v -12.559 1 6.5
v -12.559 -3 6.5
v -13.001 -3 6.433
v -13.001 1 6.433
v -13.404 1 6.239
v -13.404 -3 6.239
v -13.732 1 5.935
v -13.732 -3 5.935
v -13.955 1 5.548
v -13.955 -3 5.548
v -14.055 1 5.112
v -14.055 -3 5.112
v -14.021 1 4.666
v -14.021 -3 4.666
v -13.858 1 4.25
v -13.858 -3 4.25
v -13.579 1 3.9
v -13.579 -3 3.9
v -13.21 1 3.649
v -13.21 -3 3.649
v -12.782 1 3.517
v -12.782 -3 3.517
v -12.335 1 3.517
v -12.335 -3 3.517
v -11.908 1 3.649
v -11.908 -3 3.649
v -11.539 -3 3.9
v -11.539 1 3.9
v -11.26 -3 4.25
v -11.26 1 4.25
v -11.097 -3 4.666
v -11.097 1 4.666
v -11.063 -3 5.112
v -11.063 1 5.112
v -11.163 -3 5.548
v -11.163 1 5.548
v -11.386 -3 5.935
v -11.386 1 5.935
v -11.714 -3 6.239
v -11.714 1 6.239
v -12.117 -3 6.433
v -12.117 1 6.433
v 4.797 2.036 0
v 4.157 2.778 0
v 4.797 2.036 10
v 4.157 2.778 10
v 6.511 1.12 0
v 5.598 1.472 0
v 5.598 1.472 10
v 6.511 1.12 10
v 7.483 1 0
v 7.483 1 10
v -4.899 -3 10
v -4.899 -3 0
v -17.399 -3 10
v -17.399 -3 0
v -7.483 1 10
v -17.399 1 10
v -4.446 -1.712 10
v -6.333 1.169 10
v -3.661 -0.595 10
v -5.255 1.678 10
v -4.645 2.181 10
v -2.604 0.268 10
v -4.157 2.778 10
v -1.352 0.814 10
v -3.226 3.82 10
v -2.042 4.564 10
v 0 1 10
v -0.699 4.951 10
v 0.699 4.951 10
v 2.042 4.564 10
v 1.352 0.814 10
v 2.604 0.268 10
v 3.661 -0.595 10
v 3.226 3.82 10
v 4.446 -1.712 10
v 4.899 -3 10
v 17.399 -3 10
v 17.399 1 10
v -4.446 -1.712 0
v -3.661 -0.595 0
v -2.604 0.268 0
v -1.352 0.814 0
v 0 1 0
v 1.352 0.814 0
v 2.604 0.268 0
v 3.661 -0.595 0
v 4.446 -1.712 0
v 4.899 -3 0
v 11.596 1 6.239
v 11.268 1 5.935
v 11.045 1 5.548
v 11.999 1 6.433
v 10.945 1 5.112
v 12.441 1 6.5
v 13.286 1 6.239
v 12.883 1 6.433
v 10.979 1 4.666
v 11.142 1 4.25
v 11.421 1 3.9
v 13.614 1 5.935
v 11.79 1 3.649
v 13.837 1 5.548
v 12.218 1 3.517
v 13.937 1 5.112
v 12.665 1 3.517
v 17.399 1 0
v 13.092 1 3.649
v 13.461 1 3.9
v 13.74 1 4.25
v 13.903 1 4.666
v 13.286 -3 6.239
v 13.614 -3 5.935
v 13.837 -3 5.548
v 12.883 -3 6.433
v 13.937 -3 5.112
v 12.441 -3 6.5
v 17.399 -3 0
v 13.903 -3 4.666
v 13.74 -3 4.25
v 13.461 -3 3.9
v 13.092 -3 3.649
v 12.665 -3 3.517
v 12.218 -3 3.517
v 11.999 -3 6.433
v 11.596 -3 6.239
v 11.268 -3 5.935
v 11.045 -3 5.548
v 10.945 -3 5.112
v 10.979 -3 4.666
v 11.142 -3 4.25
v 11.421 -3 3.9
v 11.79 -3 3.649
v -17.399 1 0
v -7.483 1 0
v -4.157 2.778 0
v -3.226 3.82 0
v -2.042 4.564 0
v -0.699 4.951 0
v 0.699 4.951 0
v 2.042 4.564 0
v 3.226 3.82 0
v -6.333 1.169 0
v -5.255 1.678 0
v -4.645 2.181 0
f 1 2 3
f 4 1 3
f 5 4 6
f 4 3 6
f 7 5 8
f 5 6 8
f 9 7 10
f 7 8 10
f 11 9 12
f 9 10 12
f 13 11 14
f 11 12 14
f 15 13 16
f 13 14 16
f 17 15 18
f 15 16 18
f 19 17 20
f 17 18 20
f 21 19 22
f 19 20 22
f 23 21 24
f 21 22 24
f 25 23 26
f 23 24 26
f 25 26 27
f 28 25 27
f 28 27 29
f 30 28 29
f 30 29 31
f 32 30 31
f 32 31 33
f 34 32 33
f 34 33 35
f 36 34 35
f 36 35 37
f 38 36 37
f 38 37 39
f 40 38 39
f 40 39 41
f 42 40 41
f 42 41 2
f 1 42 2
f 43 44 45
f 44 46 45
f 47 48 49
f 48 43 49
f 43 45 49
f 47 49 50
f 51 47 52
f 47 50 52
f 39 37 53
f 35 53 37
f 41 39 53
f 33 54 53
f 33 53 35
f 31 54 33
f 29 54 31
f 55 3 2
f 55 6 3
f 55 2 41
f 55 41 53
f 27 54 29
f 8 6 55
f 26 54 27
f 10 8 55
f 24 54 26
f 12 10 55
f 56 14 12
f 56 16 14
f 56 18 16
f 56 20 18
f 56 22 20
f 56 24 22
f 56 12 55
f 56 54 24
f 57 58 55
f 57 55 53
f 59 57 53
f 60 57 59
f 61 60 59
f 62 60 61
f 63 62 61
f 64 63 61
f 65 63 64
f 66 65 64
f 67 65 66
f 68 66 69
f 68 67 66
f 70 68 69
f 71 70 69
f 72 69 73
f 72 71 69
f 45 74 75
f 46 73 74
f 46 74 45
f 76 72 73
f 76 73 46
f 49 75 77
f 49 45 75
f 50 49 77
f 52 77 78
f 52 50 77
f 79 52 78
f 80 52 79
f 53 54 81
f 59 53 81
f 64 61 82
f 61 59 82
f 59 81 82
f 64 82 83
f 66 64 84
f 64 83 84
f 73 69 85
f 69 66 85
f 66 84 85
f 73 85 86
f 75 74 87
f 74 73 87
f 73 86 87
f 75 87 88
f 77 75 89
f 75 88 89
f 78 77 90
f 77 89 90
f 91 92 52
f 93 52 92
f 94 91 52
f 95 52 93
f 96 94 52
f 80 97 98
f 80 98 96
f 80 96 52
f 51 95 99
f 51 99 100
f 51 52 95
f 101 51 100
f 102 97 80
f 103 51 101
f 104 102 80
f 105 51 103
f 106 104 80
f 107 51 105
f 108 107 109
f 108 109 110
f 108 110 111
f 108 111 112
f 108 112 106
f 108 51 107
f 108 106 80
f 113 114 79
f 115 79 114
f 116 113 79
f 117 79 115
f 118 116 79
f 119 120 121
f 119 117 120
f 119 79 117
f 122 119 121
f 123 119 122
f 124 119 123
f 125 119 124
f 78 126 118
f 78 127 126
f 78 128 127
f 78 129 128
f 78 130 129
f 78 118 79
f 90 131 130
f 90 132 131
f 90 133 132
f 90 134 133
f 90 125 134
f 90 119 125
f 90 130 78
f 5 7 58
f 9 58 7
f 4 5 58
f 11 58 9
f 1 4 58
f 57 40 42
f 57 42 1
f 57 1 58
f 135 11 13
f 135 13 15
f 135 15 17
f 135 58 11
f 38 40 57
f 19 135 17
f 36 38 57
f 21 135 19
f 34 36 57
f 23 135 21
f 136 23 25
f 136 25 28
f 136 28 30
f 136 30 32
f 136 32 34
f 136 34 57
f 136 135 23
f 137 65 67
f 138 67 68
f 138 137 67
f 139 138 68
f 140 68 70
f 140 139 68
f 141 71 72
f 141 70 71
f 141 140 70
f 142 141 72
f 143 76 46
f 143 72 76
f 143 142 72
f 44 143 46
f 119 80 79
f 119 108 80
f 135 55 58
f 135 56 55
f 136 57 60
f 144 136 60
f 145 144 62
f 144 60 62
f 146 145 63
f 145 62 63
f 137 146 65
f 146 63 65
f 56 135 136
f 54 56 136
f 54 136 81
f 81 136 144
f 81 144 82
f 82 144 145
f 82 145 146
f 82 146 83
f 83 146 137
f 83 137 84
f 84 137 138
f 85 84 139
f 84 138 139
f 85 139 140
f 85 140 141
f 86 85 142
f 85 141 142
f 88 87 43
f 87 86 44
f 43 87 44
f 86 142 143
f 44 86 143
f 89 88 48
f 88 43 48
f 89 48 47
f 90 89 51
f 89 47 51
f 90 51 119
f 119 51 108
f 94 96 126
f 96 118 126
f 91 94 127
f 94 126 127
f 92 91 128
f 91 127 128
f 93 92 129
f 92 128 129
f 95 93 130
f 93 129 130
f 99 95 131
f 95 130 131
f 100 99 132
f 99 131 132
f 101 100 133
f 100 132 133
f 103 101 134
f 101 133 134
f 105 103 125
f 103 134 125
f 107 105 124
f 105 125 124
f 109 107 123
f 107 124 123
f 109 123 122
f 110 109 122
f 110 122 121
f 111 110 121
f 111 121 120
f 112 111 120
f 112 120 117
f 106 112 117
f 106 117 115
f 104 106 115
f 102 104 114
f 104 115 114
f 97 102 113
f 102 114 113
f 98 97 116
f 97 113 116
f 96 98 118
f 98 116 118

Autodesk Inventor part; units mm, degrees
ref_plane "YZ Plane" through (0, 0, 0) normal (1, 0, 0) x (0, 1, 0)
ref_plane "XZ Plane" through (0, 0, 0) normal (0, 1, 0) x (-1, 0, 0)
ref_plane "XY Plane" through (0, 0, 0) normal (0, 0, 1) x (1, 0, 0)
sketch "Skizze1" plane through (0, 0, 0) normal (0, 0, 1) x (1, 0, 0)
  arc A0 (4.899, 1) -> (-4.899, 1) centre (0, 0) ccw
  line L0 (-17.399, 1) -> (-7.218, 1)
  line L1 (-7.218, 1) -> (-4.899, 1)
  line L2 (4.899, 1) -> (17.399, 1)
  line L3 (17.399, 1) -> (17.399, -3)
  line L4 (-17.399, -3) -> (-17.399, 1)
  arc A1 (4.899, -3) -> (-4.899, -3) centre (0, -4) ccw
  line L5 (17.399, -3) -> (4.899, -3)
  line L6 (-4.899, -3) -> (-17.399, -3)
  dimension "d0" = 10
  dimension "d1" = 1
  dimension "d3" = 10
  dimension "d16" = 4
  dimension "d17" = 12.5
  dimension "d18" = 12.5
extrude "Extrusion1" add sketch "Skizze1" along normal blind 10
fillet "Rundung1" radius 4 2 edges at (-4.899, 1, 5) (4.899, 1, 5)
sketch "Skizze4" plane through (-17.399, 1, 10) normal (0, 1, 0) x (1, 0, 0)
  line L0 (0, 10) -> (9.9157, 10) projected
  line L1 (0, 10) -> (0, 0) projected
  line L2 (9.9157, 0) -> (0, 0) projected
  line L3 (9.9157, 10) -> (9.9157, 0) projected
  line L4 (34.798, 10) -> (34.798, 0) projected
  line L5 (24.8823, 10) -> (34.798, 10) projected
  line L6 (24.8823, 0) -> (24.8823, 10) projected
  line L7 (34.798, 0) -> (24.8823, 0) projected
  point P0 (17.399, 10)
  point P1 (4.8401, 5)
  point P2 (29.8401, 5)
  dimension "d19" = 25
hole "Bohrung2" at (-12.5589, 1, 5) at (12.4411, 1, 5) direction (0, -1, 0) diameter 3 end through all
properties part number "Klemme"
